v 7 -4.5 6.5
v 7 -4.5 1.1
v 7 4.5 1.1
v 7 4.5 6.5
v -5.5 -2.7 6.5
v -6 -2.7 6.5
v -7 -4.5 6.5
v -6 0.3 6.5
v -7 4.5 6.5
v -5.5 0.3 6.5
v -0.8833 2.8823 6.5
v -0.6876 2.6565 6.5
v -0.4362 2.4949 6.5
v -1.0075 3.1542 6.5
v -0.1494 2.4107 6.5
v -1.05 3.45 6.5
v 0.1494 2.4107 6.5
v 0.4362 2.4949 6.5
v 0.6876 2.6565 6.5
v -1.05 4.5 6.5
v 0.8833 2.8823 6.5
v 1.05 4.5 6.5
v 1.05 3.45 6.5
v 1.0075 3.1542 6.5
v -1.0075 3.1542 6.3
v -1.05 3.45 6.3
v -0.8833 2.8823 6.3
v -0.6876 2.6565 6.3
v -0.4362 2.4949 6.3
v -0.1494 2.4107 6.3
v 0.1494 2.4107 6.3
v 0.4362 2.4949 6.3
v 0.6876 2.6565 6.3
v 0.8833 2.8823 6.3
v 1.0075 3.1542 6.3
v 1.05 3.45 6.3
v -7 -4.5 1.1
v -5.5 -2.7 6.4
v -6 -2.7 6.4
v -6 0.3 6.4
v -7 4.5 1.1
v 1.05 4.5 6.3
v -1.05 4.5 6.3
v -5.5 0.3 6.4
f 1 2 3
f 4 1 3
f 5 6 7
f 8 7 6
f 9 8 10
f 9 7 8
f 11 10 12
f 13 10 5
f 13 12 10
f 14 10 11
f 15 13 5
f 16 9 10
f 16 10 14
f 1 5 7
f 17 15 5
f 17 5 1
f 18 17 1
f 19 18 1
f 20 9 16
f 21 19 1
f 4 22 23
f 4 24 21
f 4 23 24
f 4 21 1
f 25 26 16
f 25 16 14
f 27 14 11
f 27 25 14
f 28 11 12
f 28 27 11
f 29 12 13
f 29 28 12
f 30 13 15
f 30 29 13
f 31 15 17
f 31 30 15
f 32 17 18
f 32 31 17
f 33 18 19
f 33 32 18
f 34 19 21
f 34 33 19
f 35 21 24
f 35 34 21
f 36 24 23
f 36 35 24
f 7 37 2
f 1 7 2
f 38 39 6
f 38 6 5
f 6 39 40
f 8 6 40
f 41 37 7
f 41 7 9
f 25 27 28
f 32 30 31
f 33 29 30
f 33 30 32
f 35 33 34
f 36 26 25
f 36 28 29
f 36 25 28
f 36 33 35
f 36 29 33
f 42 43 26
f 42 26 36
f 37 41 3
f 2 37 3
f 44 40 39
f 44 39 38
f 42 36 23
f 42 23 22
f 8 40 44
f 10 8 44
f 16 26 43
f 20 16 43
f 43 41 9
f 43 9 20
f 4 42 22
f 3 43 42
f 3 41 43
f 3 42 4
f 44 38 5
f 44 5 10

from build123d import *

# Parameters (mm, degrees)
CYLINDER_R     = 1.05
CYLINDER_DEPTH = 0.2
BOX003_W       = 2.1
BOX003_H       = 1.05
BOX003_DEPTH   = 0.2
BOX002_W       = 0.5
BOX002_H       = 3
BOX002_DEPTH   = 0.1
BOX_W          = 14
BOX_H          = 9
BOX_DEPTH      = 5.4


with BuildPart() as cylinder:
    # Cylinder → Cylinder (new body)
    with BuildSketch(Plane(origin=(0, 3.45, 6.3), x_dir=(1, 0, 0), z_dir=(0, 0, 1))):
        Circle(CYLINDER_R)
    extrude(amount=CYLINDER_DEPTH)


with BuildPart() as fusion:
    # Box003 → Box003 (new body)
    with BuildSketch(Plane(origin=(-1.05, 3.45, 6.3), x_dir=(1, 0, 0), z_dir=(0, 0, 1))):
        with Locations((1.05, 0.525)):
            Rectangle(BOX003_W, BOX003_H)
    extrude(amount=BOX003_DEPTH)

    # Fusion: union Cylinder
    add(cylinder.part)


with BuildPart() as bodystripe001:
    # Box002 → Box002 (new body)
    with BuildSketch(Plane(origin=(-6, -2.7, 6.4), x_dir=(1, 0, 0), z_dir=(0, 0, 1))):
        with Locations((0.25, 1.5)):
            Rectangle(BOX002_W, BOX002_H)
    extrude(amount=BOX002_DEPTH)


with BuildPart() as cut001:
    # Box → Box (new body)
    with BuildSketch(Plane(origin=(-7, -4.5, 1.1), x_dir=(1, 0, 0), z_dir=(0, 0, 1))):
        with Locations((7, 4.5)):
            Rectangle(BOX_W, BOX_H)
    extrude(amount=BOX_DEPTH)

    # Cut: cut BodyStripe001
    add(bodystripe001.part, mode=Mode.SUBTRACT)

    # Cut001: cut Fusion
    add(fusion.part, mode=Mode.SUBTRACT)


solid = cut001.part
